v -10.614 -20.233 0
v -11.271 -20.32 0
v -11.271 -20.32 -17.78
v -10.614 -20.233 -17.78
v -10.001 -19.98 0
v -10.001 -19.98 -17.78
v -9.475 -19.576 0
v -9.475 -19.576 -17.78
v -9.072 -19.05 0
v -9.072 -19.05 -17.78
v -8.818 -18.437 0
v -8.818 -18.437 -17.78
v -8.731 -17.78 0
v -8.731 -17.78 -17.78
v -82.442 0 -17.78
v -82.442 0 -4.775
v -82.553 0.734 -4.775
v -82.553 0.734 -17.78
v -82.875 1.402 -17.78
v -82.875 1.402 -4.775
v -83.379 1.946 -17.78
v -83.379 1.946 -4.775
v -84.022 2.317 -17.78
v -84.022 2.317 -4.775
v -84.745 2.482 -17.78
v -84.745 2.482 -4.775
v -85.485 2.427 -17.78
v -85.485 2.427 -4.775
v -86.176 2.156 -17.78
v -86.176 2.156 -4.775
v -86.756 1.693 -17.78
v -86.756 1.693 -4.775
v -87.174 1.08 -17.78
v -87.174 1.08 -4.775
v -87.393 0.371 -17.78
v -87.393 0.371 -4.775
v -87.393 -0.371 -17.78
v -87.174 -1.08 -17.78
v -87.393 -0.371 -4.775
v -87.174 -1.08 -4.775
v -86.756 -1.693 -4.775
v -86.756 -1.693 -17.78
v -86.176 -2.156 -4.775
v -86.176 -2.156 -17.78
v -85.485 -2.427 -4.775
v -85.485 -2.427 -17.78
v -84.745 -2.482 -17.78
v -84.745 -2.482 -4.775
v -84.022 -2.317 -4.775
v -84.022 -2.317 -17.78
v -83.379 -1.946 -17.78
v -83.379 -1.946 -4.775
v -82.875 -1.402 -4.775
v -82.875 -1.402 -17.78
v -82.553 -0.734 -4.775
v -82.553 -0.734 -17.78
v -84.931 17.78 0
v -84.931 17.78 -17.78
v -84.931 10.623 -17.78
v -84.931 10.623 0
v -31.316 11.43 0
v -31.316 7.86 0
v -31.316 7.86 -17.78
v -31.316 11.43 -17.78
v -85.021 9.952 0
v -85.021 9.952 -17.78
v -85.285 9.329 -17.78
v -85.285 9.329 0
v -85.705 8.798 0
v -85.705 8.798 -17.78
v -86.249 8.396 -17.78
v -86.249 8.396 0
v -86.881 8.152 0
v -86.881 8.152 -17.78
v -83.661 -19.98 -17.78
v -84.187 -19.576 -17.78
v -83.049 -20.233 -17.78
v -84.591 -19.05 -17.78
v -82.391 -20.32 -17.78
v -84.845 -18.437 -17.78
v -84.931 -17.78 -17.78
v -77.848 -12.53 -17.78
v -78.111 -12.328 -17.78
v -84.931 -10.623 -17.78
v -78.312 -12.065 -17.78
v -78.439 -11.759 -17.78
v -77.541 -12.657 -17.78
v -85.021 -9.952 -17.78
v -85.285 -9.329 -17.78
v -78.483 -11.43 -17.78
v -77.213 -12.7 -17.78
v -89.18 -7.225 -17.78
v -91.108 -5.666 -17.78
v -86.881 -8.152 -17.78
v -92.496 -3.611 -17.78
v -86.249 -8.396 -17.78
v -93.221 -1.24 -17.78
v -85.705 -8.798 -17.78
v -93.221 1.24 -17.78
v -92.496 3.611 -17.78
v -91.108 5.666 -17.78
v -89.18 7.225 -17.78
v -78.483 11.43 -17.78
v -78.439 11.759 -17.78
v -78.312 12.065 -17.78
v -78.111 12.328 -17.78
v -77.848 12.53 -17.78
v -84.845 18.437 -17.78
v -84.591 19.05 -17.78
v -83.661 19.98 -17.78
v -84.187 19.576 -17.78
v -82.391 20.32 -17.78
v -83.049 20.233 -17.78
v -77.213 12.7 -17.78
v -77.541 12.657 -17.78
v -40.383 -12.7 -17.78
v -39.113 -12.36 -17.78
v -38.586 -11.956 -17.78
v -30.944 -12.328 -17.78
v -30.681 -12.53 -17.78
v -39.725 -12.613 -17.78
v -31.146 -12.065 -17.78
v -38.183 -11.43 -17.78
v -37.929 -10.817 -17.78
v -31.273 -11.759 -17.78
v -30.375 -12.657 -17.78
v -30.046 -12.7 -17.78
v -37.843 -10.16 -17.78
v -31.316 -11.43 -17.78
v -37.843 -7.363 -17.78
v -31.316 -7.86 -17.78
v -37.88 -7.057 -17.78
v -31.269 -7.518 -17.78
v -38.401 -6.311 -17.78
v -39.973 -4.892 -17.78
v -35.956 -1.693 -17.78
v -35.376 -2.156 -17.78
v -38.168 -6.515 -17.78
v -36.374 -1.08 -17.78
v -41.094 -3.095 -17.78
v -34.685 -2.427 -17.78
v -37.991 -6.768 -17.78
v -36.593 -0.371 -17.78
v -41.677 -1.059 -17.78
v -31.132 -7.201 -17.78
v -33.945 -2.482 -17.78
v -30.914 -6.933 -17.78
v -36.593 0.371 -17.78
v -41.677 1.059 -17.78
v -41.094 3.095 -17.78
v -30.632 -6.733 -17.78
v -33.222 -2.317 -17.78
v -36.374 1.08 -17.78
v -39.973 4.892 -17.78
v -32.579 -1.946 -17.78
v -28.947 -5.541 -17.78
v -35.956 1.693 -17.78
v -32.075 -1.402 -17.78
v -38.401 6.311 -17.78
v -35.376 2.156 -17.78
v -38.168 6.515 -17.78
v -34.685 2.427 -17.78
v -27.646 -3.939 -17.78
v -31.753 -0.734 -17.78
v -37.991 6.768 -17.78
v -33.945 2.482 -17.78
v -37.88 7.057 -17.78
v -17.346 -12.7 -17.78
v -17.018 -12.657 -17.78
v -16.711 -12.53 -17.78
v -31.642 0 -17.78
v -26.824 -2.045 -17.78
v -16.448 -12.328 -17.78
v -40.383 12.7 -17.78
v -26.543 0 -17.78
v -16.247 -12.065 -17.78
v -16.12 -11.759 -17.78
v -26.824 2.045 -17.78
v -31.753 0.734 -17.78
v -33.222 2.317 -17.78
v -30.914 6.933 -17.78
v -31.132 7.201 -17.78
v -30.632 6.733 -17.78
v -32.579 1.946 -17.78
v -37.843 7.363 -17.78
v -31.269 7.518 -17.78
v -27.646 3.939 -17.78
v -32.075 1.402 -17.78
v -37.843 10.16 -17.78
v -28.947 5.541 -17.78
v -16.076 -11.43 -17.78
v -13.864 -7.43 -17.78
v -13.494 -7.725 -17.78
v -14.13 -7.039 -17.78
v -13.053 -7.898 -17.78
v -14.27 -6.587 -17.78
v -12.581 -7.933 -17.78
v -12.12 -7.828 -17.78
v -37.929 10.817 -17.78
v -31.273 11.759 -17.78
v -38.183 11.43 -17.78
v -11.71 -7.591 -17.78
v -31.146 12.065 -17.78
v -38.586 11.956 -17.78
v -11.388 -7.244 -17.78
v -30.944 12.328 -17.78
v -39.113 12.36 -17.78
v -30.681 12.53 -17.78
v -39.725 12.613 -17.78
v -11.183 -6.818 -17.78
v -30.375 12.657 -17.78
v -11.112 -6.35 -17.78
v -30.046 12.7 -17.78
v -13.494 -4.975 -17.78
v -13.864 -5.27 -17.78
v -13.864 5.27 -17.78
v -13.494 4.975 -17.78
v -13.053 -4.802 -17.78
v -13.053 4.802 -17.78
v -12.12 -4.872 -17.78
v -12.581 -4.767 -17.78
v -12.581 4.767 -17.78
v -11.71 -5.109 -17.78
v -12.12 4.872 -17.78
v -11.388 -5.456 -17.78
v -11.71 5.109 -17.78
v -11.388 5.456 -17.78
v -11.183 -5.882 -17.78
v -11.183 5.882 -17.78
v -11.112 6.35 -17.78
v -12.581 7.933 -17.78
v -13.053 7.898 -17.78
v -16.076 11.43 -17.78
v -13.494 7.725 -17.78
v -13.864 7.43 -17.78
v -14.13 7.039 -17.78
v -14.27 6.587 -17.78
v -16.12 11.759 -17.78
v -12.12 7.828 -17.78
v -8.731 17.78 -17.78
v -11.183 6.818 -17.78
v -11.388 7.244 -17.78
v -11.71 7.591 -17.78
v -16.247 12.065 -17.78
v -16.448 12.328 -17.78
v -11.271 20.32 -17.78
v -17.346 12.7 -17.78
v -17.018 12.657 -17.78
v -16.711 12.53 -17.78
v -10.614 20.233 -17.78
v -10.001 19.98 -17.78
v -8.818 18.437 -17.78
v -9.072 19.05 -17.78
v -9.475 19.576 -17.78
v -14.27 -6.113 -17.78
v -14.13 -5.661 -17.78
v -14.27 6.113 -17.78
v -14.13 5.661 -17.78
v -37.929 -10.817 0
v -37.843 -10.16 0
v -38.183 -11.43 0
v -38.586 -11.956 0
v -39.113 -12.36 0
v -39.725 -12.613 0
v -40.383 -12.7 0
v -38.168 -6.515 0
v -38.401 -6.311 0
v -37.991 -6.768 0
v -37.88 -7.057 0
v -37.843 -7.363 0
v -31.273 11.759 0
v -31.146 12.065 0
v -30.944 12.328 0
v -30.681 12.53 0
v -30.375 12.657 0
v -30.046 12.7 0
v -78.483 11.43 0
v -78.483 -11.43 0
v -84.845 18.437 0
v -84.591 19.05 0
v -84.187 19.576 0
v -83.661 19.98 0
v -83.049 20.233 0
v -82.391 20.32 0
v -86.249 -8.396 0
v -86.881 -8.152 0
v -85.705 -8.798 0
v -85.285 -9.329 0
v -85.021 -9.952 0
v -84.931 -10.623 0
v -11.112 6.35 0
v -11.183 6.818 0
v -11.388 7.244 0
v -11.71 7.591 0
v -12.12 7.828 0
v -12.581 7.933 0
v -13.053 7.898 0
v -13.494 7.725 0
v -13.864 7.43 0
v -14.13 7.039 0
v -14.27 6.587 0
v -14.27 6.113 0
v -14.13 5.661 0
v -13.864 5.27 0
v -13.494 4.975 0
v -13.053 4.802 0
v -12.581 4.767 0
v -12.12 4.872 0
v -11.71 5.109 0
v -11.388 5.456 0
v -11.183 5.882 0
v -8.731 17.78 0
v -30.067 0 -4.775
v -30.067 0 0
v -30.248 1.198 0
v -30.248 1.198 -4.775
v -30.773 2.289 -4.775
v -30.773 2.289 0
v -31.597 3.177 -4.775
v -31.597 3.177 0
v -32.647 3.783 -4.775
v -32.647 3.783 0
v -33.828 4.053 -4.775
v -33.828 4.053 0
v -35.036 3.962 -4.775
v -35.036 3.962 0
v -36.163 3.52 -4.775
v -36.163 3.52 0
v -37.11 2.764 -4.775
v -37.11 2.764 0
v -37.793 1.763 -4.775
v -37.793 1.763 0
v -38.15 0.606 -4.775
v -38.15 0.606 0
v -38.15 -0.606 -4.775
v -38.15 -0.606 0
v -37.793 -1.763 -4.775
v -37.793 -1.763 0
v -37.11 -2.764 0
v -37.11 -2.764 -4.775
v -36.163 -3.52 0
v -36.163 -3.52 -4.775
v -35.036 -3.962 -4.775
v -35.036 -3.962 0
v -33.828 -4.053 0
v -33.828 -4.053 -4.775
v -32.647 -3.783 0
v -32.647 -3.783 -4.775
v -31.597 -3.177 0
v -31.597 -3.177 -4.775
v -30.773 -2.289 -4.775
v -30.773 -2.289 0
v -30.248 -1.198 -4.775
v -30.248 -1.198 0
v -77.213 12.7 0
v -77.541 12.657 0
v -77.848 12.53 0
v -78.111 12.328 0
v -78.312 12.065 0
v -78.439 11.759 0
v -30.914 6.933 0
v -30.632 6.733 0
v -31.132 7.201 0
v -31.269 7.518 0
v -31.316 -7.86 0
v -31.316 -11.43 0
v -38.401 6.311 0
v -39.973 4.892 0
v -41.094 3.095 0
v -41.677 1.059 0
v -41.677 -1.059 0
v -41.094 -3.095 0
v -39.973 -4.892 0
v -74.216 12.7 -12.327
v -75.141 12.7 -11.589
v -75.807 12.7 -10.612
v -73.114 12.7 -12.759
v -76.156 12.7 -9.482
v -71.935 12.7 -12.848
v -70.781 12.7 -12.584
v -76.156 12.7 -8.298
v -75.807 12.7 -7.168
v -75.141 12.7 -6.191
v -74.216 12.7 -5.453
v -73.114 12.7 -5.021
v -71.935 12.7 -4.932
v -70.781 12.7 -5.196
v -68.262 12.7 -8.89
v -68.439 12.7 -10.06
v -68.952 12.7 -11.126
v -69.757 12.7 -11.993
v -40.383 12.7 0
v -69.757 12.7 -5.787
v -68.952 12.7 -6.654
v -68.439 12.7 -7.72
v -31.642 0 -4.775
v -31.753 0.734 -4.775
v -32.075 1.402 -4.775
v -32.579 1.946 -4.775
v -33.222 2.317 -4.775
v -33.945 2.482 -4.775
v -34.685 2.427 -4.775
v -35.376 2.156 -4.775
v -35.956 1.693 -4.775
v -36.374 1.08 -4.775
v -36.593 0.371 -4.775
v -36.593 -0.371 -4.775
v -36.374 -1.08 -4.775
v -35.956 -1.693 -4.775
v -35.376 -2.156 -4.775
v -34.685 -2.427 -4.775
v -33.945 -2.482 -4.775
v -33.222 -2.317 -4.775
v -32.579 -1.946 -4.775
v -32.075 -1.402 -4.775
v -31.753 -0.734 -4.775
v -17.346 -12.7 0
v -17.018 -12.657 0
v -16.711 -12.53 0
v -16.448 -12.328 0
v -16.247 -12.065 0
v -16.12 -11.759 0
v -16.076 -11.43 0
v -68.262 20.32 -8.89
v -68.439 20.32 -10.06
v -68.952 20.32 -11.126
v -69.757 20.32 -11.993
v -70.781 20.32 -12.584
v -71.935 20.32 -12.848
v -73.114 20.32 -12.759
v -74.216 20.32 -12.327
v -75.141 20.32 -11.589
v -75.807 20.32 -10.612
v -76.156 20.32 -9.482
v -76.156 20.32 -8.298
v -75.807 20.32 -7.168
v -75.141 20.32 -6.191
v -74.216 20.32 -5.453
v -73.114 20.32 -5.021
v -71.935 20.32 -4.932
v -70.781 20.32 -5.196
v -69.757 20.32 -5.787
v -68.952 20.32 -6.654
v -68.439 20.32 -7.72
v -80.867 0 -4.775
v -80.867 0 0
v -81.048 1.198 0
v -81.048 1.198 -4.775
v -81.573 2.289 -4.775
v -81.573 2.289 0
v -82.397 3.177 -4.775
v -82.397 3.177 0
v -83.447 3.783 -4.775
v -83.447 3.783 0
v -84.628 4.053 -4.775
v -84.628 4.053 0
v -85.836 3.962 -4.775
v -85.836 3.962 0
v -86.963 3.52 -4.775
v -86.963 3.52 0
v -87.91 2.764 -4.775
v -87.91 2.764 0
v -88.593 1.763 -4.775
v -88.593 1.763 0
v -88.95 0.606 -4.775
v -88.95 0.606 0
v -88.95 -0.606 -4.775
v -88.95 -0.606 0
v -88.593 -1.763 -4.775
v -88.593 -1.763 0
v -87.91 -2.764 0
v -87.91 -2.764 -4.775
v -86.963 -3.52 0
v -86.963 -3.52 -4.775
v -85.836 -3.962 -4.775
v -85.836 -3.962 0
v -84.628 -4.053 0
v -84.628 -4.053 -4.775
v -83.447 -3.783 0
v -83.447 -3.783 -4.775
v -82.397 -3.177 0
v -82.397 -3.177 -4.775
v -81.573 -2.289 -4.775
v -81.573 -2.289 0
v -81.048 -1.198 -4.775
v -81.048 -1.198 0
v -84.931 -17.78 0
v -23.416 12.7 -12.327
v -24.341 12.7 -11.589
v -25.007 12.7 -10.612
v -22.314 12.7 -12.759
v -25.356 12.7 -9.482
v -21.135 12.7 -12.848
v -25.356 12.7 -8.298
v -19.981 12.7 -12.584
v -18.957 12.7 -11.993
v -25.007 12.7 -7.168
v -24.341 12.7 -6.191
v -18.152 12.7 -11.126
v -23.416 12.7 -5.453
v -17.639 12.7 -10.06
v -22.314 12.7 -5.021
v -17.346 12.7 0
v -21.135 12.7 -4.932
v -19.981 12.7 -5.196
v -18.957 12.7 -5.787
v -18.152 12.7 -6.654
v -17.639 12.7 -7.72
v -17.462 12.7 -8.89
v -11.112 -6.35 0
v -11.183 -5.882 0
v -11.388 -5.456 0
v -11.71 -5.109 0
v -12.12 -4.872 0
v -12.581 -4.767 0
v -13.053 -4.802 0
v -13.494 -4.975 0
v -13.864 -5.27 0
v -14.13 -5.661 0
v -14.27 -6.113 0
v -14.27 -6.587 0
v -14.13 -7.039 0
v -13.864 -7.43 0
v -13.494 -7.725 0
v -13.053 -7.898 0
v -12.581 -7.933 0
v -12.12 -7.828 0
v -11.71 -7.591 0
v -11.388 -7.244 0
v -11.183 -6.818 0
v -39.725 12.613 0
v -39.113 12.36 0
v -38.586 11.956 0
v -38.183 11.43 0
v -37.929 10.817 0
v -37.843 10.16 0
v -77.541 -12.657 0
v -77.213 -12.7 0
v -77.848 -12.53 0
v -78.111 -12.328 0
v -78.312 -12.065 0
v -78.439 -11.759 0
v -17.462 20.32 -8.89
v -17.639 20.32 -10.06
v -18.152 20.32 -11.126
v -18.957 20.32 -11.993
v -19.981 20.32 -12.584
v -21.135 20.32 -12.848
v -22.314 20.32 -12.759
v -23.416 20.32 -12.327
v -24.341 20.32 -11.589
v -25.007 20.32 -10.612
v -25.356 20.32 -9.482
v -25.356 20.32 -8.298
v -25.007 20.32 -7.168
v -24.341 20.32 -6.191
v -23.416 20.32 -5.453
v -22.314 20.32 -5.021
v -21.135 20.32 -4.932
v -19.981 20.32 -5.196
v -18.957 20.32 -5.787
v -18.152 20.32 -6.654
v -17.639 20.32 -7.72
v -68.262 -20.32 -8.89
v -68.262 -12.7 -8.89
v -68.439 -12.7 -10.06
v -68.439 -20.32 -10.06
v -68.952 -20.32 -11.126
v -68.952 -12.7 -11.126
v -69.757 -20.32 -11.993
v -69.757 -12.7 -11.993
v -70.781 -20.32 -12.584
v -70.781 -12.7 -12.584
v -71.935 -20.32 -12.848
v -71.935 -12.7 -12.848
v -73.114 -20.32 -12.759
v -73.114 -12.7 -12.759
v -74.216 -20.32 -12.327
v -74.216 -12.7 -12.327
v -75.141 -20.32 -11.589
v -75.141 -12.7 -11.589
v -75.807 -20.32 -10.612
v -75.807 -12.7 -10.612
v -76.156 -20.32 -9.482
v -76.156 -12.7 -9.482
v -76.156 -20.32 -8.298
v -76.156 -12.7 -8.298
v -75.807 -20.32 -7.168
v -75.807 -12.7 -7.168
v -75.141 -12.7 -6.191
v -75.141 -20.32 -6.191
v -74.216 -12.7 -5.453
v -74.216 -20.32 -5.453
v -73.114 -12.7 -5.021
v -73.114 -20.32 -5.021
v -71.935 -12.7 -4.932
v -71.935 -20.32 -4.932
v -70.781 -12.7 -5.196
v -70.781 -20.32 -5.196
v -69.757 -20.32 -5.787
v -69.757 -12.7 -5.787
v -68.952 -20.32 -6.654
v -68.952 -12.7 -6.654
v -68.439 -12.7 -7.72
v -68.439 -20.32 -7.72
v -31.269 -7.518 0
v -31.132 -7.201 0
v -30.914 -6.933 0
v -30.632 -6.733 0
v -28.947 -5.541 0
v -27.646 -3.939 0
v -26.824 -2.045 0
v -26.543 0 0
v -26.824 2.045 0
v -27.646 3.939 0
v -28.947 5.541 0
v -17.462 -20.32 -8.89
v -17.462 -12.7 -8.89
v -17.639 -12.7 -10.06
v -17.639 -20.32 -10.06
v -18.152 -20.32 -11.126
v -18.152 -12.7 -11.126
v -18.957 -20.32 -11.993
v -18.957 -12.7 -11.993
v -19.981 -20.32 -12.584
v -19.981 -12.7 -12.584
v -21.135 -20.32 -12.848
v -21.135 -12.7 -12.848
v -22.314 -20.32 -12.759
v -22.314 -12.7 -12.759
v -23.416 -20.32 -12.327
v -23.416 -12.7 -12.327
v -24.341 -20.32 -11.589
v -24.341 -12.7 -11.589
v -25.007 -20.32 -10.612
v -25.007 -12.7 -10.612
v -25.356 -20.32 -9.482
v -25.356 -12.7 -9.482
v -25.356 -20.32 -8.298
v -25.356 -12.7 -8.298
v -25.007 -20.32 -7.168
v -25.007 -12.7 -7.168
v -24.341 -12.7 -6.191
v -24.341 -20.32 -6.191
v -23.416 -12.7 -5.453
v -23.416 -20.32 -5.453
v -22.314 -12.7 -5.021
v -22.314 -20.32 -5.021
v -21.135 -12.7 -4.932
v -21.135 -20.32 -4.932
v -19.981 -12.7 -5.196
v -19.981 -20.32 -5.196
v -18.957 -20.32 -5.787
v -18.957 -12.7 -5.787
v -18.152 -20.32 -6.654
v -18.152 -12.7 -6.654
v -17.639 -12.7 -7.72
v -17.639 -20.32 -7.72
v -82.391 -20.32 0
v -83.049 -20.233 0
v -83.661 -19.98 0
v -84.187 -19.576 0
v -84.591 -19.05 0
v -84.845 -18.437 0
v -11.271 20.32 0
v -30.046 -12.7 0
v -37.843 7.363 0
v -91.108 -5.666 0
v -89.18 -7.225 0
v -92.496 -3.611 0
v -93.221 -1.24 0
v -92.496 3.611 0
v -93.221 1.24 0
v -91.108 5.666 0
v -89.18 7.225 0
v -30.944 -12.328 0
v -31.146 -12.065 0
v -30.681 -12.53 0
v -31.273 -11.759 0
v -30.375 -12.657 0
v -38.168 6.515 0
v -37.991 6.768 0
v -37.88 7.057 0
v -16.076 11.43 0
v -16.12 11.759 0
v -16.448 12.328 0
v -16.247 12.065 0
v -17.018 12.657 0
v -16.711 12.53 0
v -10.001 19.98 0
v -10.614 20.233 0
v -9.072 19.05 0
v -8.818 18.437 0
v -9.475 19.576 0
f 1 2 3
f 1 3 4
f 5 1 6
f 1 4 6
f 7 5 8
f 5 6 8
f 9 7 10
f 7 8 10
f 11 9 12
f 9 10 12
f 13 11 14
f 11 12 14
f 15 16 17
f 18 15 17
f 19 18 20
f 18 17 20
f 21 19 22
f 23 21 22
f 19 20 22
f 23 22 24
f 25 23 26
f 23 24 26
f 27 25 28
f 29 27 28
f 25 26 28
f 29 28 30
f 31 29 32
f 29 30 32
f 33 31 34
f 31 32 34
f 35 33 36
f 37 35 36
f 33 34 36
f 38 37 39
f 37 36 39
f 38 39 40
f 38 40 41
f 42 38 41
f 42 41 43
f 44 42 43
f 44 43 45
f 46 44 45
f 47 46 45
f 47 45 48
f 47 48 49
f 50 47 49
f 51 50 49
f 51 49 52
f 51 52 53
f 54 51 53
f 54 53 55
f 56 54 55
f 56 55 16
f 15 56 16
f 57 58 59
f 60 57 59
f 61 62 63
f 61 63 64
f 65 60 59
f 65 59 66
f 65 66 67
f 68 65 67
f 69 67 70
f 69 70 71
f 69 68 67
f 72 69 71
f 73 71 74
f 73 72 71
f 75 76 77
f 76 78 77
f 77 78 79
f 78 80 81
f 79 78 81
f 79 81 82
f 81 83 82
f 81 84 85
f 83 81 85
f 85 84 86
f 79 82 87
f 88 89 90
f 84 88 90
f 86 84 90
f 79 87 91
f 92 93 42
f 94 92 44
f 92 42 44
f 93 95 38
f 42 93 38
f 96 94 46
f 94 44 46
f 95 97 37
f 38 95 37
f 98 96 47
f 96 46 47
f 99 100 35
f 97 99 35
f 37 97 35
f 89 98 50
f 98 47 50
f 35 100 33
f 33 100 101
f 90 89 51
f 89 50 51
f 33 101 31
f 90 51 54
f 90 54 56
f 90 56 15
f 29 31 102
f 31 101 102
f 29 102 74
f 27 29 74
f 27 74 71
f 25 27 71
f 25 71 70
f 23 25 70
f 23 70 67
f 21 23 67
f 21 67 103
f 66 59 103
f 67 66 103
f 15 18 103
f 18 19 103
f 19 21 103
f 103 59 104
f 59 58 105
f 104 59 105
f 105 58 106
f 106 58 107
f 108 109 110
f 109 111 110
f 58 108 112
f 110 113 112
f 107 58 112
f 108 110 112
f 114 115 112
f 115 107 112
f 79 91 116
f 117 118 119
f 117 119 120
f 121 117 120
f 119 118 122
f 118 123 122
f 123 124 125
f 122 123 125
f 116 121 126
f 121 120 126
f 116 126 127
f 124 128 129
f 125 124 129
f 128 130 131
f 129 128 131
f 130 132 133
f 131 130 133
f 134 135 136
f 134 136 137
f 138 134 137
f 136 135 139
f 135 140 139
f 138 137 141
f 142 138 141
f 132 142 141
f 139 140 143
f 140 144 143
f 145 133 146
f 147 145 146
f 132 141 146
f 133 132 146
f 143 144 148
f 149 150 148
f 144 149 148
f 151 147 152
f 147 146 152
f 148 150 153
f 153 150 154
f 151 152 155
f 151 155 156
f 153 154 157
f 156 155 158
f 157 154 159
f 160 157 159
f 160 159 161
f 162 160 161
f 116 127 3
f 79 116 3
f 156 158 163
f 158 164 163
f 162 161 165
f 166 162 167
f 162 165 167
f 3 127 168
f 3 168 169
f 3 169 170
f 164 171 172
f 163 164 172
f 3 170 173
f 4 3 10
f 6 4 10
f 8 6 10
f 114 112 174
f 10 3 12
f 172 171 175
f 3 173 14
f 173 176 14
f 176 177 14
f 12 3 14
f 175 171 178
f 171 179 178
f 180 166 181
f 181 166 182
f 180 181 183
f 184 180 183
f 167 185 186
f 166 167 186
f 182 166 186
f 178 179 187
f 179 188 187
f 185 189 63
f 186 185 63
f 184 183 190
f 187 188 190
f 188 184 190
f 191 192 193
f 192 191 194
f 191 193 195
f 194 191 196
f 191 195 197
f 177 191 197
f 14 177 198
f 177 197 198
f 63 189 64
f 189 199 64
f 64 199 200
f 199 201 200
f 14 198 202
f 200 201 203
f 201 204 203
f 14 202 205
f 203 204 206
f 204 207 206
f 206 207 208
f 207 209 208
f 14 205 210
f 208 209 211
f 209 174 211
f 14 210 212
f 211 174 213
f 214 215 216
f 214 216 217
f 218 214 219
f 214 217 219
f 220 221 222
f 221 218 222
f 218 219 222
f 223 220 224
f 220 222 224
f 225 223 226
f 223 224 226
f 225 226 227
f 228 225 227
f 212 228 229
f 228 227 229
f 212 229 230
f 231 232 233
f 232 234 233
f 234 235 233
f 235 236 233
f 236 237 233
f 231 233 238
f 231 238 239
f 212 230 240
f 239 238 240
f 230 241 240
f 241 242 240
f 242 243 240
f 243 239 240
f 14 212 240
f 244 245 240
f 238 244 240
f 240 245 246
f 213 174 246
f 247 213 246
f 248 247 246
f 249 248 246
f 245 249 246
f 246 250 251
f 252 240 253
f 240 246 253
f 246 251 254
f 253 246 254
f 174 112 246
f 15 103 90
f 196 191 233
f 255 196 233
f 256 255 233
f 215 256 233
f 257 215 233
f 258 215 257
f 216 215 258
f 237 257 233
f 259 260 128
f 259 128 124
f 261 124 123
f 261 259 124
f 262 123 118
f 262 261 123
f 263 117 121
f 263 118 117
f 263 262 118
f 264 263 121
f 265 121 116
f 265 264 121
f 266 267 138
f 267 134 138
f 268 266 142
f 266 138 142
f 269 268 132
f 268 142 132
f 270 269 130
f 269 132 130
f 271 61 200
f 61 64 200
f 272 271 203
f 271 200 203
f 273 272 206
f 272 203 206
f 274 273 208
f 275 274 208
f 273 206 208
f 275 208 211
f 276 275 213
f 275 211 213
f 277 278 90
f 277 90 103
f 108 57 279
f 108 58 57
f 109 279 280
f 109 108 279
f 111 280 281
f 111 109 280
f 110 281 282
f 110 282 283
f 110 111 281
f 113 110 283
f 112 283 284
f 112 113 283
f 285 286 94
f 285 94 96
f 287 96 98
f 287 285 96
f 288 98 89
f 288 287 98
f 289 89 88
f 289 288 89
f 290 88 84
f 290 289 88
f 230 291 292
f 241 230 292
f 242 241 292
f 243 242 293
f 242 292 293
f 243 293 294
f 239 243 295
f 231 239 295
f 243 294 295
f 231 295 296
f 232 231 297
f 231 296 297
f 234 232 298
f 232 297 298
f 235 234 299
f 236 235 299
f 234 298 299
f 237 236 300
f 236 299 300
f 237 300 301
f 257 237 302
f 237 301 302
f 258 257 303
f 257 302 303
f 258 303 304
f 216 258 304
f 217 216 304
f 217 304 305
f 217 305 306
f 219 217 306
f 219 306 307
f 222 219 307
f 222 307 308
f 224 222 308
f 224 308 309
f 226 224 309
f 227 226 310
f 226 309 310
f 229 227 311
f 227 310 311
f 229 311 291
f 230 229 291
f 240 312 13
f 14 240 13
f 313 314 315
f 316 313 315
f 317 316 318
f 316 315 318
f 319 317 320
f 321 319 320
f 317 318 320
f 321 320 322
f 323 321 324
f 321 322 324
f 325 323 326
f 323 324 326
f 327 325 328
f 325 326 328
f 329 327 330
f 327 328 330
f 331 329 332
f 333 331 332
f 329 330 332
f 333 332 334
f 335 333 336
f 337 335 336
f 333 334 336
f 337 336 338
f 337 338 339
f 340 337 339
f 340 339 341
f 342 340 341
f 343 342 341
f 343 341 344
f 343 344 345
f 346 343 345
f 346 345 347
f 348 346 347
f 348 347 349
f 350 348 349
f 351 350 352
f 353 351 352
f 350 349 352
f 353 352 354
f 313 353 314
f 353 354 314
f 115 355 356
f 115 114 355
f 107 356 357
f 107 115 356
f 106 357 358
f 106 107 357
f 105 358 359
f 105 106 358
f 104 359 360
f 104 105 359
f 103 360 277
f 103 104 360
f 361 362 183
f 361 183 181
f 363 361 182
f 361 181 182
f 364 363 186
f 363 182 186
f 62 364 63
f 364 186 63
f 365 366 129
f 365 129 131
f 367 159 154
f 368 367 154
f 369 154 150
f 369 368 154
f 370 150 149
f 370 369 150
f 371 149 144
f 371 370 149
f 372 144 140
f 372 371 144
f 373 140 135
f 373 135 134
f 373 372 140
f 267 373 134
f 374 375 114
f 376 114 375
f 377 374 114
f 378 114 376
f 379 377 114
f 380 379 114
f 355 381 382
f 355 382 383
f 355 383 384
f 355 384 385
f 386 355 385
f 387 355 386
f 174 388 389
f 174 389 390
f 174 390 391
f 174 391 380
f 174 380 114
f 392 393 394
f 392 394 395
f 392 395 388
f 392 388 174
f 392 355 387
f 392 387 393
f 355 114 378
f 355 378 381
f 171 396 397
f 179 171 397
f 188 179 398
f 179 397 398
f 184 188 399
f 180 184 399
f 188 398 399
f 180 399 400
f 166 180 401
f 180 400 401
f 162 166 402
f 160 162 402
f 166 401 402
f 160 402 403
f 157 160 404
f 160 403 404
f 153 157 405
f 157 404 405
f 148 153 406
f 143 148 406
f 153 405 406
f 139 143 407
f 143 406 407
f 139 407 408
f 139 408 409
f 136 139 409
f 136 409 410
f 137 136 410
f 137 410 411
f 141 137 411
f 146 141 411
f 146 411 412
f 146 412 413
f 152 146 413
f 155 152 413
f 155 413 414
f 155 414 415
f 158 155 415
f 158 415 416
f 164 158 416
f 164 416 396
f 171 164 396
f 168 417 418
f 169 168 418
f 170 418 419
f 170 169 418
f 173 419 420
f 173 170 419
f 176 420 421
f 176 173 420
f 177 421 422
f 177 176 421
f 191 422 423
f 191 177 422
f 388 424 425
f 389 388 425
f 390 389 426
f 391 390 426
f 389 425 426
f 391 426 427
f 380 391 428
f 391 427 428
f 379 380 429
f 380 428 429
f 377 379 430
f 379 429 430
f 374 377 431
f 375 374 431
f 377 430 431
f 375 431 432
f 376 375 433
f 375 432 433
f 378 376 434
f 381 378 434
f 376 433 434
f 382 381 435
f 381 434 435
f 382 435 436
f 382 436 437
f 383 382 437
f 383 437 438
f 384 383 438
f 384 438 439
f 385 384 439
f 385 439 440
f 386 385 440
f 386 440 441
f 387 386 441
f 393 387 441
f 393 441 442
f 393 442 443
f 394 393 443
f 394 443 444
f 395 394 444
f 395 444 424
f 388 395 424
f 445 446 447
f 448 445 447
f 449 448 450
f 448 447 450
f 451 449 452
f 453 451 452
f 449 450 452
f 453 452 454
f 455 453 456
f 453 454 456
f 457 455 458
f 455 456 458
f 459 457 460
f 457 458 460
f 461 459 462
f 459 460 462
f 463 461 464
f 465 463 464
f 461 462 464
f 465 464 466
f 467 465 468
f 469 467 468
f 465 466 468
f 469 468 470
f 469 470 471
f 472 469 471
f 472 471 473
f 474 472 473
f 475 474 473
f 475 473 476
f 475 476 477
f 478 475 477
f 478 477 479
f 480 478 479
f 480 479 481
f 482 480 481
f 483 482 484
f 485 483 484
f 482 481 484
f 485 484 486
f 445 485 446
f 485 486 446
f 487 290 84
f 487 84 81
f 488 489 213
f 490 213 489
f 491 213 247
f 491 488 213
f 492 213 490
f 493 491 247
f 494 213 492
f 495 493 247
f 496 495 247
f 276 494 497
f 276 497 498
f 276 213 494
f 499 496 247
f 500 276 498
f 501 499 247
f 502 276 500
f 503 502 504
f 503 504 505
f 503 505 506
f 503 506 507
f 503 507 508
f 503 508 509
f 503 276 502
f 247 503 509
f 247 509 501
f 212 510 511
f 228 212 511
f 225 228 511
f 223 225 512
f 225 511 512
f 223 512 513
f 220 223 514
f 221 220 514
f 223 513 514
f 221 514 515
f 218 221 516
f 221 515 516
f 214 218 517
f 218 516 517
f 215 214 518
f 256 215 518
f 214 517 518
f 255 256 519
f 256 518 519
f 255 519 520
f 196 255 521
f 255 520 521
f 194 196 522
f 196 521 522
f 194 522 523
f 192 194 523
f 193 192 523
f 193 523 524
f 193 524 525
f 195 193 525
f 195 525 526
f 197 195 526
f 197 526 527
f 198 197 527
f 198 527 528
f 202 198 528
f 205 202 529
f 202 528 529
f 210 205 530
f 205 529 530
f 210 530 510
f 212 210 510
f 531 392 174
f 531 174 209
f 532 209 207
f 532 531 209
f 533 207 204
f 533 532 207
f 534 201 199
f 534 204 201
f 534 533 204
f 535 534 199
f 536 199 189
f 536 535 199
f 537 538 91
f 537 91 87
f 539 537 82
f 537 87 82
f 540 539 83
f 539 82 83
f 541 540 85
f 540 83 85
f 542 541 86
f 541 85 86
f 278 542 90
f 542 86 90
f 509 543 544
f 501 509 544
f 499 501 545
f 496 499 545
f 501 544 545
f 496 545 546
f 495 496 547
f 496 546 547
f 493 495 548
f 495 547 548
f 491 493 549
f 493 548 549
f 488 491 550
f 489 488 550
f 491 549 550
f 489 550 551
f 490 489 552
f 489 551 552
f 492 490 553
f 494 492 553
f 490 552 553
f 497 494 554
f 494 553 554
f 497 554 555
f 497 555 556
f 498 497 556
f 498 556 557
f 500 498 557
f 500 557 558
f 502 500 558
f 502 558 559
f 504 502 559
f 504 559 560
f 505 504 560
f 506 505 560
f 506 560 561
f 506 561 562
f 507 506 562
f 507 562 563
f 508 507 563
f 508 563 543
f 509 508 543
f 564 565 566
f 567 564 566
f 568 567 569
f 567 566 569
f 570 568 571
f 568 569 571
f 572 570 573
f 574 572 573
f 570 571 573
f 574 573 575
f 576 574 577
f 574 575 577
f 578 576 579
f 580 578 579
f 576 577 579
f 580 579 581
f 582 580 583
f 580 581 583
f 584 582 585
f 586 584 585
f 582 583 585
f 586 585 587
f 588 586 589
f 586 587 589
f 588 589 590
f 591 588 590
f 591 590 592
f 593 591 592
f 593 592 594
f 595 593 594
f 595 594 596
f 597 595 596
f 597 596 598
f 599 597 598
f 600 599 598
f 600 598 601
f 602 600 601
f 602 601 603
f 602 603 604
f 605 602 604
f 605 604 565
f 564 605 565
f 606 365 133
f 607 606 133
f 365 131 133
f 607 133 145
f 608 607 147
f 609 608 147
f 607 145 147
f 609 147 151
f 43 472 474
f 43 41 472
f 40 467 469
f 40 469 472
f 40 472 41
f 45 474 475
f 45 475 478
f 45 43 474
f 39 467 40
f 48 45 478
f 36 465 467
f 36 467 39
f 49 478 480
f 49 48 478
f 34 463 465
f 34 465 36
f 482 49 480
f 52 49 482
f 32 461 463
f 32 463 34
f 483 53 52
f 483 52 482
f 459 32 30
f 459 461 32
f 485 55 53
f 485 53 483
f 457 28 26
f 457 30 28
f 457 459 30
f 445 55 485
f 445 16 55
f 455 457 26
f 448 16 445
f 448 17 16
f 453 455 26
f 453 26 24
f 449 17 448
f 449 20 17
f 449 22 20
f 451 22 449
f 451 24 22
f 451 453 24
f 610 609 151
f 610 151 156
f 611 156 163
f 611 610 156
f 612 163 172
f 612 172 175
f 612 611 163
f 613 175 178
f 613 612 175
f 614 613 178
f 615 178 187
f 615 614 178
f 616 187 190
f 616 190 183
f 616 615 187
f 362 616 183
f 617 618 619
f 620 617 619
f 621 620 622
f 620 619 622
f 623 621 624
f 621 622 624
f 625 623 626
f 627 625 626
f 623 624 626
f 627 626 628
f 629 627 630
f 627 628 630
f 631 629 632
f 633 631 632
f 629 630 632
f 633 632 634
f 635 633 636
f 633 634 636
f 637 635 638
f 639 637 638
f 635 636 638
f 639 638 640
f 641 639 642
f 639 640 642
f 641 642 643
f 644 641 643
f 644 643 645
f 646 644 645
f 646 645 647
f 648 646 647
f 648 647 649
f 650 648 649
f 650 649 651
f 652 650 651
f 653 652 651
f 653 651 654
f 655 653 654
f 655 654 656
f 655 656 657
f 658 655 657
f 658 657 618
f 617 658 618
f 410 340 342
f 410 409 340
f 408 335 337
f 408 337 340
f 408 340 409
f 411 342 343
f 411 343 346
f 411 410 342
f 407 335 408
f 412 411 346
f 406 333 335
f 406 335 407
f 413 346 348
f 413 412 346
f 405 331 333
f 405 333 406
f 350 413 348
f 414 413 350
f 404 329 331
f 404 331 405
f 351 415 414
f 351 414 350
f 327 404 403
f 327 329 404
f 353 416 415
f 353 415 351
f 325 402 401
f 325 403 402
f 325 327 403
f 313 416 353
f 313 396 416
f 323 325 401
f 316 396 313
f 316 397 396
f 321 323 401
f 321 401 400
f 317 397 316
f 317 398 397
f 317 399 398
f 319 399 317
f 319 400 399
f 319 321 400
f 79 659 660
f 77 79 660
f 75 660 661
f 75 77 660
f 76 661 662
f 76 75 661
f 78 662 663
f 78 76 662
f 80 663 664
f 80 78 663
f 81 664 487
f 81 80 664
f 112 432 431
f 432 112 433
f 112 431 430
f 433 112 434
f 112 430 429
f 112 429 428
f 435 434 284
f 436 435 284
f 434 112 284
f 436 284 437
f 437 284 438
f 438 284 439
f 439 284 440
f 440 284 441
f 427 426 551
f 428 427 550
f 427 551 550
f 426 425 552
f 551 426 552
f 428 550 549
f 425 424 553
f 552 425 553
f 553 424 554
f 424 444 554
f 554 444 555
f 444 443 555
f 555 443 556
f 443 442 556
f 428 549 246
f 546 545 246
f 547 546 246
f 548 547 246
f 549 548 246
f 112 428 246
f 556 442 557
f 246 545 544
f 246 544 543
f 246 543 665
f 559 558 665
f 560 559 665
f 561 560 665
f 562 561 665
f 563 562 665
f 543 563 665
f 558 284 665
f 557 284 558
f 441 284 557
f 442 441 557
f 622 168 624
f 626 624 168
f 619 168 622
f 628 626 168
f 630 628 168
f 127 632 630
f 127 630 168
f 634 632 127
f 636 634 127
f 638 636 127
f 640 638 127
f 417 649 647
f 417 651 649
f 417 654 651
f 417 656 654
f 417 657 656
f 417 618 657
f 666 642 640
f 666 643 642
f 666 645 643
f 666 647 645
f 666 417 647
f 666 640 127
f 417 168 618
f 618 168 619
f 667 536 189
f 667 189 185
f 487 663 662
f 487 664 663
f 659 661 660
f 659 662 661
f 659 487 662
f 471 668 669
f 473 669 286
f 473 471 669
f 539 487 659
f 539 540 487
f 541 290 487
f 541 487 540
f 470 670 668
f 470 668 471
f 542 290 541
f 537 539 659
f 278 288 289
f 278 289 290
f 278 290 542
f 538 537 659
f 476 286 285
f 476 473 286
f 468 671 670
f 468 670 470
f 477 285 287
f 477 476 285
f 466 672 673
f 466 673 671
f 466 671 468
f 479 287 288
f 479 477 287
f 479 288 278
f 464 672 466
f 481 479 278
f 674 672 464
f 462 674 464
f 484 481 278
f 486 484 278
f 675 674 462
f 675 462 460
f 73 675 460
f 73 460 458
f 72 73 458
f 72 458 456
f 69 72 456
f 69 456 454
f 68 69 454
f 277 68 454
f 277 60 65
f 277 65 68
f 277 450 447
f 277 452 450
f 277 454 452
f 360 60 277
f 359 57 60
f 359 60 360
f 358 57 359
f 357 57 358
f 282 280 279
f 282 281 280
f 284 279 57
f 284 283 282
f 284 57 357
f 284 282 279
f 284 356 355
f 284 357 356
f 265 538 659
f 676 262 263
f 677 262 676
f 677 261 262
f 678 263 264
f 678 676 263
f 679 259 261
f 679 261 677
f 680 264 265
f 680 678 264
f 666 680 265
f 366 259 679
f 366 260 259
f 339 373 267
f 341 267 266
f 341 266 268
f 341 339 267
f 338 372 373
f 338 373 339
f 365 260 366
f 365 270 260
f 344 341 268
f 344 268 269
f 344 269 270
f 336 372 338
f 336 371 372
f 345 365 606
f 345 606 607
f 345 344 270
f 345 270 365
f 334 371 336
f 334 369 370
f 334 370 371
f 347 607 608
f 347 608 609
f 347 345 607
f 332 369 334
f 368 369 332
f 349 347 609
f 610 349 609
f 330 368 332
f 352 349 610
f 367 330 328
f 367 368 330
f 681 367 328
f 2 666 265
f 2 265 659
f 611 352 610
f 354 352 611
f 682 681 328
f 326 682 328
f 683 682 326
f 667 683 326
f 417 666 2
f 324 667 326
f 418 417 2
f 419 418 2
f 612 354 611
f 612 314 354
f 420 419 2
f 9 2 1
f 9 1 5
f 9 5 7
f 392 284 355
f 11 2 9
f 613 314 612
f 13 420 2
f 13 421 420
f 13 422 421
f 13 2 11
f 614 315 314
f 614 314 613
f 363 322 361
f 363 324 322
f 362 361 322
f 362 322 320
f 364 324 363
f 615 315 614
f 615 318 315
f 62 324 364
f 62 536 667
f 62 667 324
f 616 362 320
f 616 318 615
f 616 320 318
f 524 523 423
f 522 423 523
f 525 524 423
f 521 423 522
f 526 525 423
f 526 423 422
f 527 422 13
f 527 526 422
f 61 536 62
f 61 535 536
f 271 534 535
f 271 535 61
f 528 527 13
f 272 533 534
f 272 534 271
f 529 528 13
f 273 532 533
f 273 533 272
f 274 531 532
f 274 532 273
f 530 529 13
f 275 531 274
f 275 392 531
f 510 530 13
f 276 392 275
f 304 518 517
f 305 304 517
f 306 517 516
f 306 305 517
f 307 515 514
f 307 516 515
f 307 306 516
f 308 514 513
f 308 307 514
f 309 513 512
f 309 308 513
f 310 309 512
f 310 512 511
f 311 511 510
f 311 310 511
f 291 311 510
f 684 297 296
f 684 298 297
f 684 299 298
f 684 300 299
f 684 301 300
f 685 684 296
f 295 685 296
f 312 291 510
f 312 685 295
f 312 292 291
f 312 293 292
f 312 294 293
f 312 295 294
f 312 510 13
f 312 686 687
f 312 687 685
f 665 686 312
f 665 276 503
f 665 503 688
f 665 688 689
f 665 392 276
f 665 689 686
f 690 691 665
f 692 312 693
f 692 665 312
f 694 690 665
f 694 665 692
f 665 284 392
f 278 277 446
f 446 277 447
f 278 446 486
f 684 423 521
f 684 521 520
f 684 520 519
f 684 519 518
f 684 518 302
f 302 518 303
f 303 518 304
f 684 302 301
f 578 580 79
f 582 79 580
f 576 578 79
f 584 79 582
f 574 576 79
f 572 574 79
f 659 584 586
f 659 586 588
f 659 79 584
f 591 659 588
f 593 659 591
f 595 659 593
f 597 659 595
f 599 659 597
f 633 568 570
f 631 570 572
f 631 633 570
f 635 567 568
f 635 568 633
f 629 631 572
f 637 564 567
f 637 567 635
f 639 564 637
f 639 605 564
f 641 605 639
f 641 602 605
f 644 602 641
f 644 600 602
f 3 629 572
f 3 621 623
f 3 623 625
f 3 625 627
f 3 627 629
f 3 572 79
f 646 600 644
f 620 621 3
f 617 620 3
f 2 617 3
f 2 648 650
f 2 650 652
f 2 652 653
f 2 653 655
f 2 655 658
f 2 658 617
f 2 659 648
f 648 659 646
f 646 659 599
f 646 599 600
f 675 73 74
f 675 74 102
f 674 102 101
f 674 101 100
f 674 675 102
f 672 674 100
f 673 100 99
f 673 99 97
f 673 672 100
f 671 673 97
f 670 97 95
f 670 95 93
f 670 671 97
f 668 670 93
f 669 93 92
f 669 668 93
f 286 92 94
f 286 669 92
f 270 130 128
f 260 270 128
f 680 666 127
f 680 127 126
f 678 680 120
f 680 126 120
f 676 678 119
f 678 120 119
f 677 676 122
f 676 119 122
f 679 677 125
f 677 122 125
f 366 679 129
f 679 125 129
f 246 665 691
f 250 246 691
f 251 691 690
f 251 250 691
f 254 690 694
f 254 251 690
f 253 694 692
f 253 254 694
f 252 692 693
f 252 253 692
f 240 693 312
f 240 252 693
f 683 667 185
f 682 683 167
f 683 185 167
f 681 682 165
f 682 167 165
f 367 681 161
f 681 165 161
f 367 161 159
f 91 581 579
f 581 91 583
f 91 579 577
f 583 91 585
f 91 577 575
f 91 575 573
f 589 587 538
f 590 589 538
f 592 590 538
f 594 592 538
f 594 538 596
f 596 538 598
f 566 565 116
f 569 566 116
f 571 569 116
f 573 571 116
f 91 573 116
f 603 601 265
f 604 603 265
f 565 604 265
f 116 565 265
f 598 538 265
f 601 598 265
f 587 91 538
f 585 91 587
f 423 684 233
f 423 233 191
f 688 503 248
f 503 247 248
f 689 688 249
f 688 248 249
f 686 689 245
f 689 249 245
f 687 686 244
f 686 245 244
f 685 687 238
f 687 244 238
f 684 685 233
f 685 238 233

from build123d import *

# Parameters (mm, degrees)
SKETCH1_W           = 93.6625
SKETCH1_H           = 40.64
SKETCH1_R           = 2.4892
SKETCH1_R_2         = 1.5875
BOSS_EXTRUDE1_DEPTH = 17.78
SKETCH6_R           = 3.96875
CUT_EXTRUDE4_DEPTH  = 41.64
CUT_EXTRUDE3_DEPTH  = 17.78
FILLET1_R           = 2.54
SKETCH3_R           = 4.064
CUT_EXTRUDE5_DEPTH  = 4.7752
SKETCH7_W           = 9.113549332
SKETCH7_H           = 21.245092044
CUT_EXTRUDE6_DEPTH  = 18.78
SKETCH8_W           = 17.78
SKETCH8_H           = 25.4
CUT_EXTRUDE7_DEPTH  = 17.78
FILLET2_R           = 1.27


with BuildPart() as part:
    # Sketch1 → Boss-Extrude1 (new body)
    with BuildSketch(Plane.XY):
        with Locations((-46.83125, 0)):
            Rectangle(SKETCH1_W, SKETCH1_H)
        with Locations((-84.93125, 0)):
            Circle(SKETCH1_R, mode=Mode.SUBTRACT)
        with Locations((-34.13125, 0)):
            Circle(SKETCH1_R, mode=Mode.SUBTRACT)
        with Locations((-12.7, 6.35)):
            Circle(SKETCH1_R_2, mode=Mode.SUBTRACT)
        with Locations((-12.7, -6.35)):
            Circle(SKETCH1_R_2, mode=Mode.SUBTRACT)
    extrude(amount=-BOSS_EXTRUDE1_DEPTH)

    # Sketch6 → Cut-Extrude4 (cut, through all)
    with BuildSketch(Plane(origin=(0, 20.32, 0), x_dir=(1, 0, 0), z_dir=(0, 1, 0))):
        with Locations((-72.23125, 8.89)):
            Circle(SKETCH6_R)
        with Locations((-21.43125, 8.89)):
            Circle(SKETCH6_R)
    extrude(amount=-CUT_EXTRUDE4_DEPTH, mode=Mode.SUBTRACT)

    # Sketch5 → Cut-Extrude3 (cut)
    with BuildSketch(Plane.XY):
        with BuildLine():
            Line((-93.6625, -20.32), (-93.6625, 20.32))
            Line((-93.6625, 20.32), (-84.93125, 20.32))
            Line((-84.93125, 20.32), (-84.93125, 10.622546022))
            ThreePointArc((-84.93125, 10.622546022), (-85.477262526, 9.049137635), (-86.880552326, 8.152186482))
            ThreePointArc((-86.880552326, 8.152186482), (-93.31325, 0), (-86.880552326, -8.152186482))
            ThreePointArc((-86.880552326, -8.152186482), (-85.477262526, -9.049137635), (-84.93125, -10.622546022))
            Line((-84.93125, -10.622546022), (-84.93125, -20.32))
            Line((-84.93125, -20.32), (-93.6625, -20.32))
        make_face()
        with BuildLine():
            Line((0, -20.32), (0, 20.32))
            Line((0, 20.32), (-8.73125, 20.32))
            Line((-8.73125, 20.32), (-8.73125, 10.622546022))
            ThreePointArc((-8.73125, 10.622546022), (-8.185237474, 9.049137635), (-6.781947674, 8.152186482))
            ThreePointArc((-6.781947674, 8.152186482), (-0.34925, 0), (-6.781947674, -8.152186482))
            ThreePointArc((-6.781947674, -8.152186482), (-8.185237474, -9.049137635), (-8.73125, -10.622546022))
            Line((-8.73125, -10.622546022), (-8.73125, -20.32))
            Line((-8.73125, -20.32), (0, -20.32))
        make_face()
    extrude(amount=-CUT_EXTRUDE3_DEPTH, mode=Mode.SUBTRACT)

    # Fillet1
    fillet1_edges = [part.edges().sort_by_distance(p)[0] for p in [
        (-84.93125, 20.32, -8.89),
        (-84.93125, -20.32, -8.89),
        (-8.73125, 20.32, -8.89),
        (-8.73125, -20.32, -8.89),
    ]]
    fillet(fillet1_edges, radius=FILLET1_R)

    # Sketch3 → Cut-Extrude5 (cut)
    with BuildSketch(Plane.XY):
        with Locations((-84.93125, 0)):
            Circle(SKETCH3_R)
        with Locations((-34.13125, 0)):
            Circle(SKETCH3_R)
    extrude(amount=-CUT_EXTRUDE5_DEPTH, mode=Mode.SUBTRACT)

    # Sketch7 → Cut-Extrude6 (cut, through all)
    with BuildSketch(Plane.XY):
        with BuildLine():
            Line((-37.842518981, 10.16), (-37.842518981, 6.655139559))
            ThreePointArc((-37.842518981, 6.655139559), (-41.75125, 0), (-37.842518981, -6.655139559))
            Line((-37.842518981, -6.655139559), (-37.842518981, -10.16))
            ThreePointArc((-37.842518981, -10.16), (-38.586467757, -11.956051224), (-40.382518981, -12.7))
            Line((-40.382518981, -12.7), (-60.702518981, -12.7))
            ThreePointArc((-60.702518981, -12.7), (-62.498570205, -11.956051224), (-63.242518981, -10.16))
            Line((-63.242518981, -10.16), (-63.242518981, 10.16))
            ThreePointArc((-63.242518981, 10.16), (-62.498570205, 11.956051224), (-60.702518981, 12.7))
            Line((-60.702518981, 12.7), (-40.382518981, 12.7))
            ThreePointArc((-40.382518981, 12.7), (-38.586467757, 11.956051224), (-37.842518981, 10.16))
        make_face()
        with Locations((-4.174475334, 0)):
            Rectangle(SKETCH7_W, SKETCH7_H)
    extrude(amount=-CUT_EXTRUDE6_DEPTH, mode=Mode.SUBTRACT)

    # Sketch8 → Cut-Extrude7 (cut)
    with BuildSketch(Plane.XY):
        with Locations((-69.592518981, 0)):
            Rectangle(SKETCH8_W, SKETCH8_H)
        with BuildLine():
            Line((-31.316413003, 12.7), (-16.076413003, 12.7))
            Line((-16.076413003, 12.7), (-16.076413003, -12.7))
            Line((-16.076413003, -12.7), (-31.316413003, -12.7))
            Line((-31.316413003, -12.7), (-31.316413003, -7.046567735))
            ThreePointArc((-31.316413003, -7.046567735), (-26.543271075, 0), (-31.316413003, 7.046567735))
            Line((-31.316413003, 7.046567735), (-31.316413003, 12.7))
        make_face()
    extrude(amount=-CUT_EXTRUDE7_DEPTH, mode=Mode.SUBTRACT)

    # Fillet2
    fillet2_edges = [part.edges().sort_by_distance(p)[0] for p in [
        (-37.842518981, 6.655139559, -8.89),
        (-37.842518981, -6.655139559, -8.89),
        (-78.482518981, 12.7, -8.89),
        (-78.482518981, -12.7, -8.89),
        (-16.076413003, -12.7, -8.89),
        (-31.316413003, 12.7, -8.89),
        (-31.316413003, -12.7, -8.89),
        (-16.076413003, 12.7, -8.89),
        (-31.316413003, 7.046567735, -8.89),
        (-31.316413003, -7.046567735, -8.89),
    ]]
    fillet(fillet2_edges, radius=FILLET2_R)


solid = part.part
